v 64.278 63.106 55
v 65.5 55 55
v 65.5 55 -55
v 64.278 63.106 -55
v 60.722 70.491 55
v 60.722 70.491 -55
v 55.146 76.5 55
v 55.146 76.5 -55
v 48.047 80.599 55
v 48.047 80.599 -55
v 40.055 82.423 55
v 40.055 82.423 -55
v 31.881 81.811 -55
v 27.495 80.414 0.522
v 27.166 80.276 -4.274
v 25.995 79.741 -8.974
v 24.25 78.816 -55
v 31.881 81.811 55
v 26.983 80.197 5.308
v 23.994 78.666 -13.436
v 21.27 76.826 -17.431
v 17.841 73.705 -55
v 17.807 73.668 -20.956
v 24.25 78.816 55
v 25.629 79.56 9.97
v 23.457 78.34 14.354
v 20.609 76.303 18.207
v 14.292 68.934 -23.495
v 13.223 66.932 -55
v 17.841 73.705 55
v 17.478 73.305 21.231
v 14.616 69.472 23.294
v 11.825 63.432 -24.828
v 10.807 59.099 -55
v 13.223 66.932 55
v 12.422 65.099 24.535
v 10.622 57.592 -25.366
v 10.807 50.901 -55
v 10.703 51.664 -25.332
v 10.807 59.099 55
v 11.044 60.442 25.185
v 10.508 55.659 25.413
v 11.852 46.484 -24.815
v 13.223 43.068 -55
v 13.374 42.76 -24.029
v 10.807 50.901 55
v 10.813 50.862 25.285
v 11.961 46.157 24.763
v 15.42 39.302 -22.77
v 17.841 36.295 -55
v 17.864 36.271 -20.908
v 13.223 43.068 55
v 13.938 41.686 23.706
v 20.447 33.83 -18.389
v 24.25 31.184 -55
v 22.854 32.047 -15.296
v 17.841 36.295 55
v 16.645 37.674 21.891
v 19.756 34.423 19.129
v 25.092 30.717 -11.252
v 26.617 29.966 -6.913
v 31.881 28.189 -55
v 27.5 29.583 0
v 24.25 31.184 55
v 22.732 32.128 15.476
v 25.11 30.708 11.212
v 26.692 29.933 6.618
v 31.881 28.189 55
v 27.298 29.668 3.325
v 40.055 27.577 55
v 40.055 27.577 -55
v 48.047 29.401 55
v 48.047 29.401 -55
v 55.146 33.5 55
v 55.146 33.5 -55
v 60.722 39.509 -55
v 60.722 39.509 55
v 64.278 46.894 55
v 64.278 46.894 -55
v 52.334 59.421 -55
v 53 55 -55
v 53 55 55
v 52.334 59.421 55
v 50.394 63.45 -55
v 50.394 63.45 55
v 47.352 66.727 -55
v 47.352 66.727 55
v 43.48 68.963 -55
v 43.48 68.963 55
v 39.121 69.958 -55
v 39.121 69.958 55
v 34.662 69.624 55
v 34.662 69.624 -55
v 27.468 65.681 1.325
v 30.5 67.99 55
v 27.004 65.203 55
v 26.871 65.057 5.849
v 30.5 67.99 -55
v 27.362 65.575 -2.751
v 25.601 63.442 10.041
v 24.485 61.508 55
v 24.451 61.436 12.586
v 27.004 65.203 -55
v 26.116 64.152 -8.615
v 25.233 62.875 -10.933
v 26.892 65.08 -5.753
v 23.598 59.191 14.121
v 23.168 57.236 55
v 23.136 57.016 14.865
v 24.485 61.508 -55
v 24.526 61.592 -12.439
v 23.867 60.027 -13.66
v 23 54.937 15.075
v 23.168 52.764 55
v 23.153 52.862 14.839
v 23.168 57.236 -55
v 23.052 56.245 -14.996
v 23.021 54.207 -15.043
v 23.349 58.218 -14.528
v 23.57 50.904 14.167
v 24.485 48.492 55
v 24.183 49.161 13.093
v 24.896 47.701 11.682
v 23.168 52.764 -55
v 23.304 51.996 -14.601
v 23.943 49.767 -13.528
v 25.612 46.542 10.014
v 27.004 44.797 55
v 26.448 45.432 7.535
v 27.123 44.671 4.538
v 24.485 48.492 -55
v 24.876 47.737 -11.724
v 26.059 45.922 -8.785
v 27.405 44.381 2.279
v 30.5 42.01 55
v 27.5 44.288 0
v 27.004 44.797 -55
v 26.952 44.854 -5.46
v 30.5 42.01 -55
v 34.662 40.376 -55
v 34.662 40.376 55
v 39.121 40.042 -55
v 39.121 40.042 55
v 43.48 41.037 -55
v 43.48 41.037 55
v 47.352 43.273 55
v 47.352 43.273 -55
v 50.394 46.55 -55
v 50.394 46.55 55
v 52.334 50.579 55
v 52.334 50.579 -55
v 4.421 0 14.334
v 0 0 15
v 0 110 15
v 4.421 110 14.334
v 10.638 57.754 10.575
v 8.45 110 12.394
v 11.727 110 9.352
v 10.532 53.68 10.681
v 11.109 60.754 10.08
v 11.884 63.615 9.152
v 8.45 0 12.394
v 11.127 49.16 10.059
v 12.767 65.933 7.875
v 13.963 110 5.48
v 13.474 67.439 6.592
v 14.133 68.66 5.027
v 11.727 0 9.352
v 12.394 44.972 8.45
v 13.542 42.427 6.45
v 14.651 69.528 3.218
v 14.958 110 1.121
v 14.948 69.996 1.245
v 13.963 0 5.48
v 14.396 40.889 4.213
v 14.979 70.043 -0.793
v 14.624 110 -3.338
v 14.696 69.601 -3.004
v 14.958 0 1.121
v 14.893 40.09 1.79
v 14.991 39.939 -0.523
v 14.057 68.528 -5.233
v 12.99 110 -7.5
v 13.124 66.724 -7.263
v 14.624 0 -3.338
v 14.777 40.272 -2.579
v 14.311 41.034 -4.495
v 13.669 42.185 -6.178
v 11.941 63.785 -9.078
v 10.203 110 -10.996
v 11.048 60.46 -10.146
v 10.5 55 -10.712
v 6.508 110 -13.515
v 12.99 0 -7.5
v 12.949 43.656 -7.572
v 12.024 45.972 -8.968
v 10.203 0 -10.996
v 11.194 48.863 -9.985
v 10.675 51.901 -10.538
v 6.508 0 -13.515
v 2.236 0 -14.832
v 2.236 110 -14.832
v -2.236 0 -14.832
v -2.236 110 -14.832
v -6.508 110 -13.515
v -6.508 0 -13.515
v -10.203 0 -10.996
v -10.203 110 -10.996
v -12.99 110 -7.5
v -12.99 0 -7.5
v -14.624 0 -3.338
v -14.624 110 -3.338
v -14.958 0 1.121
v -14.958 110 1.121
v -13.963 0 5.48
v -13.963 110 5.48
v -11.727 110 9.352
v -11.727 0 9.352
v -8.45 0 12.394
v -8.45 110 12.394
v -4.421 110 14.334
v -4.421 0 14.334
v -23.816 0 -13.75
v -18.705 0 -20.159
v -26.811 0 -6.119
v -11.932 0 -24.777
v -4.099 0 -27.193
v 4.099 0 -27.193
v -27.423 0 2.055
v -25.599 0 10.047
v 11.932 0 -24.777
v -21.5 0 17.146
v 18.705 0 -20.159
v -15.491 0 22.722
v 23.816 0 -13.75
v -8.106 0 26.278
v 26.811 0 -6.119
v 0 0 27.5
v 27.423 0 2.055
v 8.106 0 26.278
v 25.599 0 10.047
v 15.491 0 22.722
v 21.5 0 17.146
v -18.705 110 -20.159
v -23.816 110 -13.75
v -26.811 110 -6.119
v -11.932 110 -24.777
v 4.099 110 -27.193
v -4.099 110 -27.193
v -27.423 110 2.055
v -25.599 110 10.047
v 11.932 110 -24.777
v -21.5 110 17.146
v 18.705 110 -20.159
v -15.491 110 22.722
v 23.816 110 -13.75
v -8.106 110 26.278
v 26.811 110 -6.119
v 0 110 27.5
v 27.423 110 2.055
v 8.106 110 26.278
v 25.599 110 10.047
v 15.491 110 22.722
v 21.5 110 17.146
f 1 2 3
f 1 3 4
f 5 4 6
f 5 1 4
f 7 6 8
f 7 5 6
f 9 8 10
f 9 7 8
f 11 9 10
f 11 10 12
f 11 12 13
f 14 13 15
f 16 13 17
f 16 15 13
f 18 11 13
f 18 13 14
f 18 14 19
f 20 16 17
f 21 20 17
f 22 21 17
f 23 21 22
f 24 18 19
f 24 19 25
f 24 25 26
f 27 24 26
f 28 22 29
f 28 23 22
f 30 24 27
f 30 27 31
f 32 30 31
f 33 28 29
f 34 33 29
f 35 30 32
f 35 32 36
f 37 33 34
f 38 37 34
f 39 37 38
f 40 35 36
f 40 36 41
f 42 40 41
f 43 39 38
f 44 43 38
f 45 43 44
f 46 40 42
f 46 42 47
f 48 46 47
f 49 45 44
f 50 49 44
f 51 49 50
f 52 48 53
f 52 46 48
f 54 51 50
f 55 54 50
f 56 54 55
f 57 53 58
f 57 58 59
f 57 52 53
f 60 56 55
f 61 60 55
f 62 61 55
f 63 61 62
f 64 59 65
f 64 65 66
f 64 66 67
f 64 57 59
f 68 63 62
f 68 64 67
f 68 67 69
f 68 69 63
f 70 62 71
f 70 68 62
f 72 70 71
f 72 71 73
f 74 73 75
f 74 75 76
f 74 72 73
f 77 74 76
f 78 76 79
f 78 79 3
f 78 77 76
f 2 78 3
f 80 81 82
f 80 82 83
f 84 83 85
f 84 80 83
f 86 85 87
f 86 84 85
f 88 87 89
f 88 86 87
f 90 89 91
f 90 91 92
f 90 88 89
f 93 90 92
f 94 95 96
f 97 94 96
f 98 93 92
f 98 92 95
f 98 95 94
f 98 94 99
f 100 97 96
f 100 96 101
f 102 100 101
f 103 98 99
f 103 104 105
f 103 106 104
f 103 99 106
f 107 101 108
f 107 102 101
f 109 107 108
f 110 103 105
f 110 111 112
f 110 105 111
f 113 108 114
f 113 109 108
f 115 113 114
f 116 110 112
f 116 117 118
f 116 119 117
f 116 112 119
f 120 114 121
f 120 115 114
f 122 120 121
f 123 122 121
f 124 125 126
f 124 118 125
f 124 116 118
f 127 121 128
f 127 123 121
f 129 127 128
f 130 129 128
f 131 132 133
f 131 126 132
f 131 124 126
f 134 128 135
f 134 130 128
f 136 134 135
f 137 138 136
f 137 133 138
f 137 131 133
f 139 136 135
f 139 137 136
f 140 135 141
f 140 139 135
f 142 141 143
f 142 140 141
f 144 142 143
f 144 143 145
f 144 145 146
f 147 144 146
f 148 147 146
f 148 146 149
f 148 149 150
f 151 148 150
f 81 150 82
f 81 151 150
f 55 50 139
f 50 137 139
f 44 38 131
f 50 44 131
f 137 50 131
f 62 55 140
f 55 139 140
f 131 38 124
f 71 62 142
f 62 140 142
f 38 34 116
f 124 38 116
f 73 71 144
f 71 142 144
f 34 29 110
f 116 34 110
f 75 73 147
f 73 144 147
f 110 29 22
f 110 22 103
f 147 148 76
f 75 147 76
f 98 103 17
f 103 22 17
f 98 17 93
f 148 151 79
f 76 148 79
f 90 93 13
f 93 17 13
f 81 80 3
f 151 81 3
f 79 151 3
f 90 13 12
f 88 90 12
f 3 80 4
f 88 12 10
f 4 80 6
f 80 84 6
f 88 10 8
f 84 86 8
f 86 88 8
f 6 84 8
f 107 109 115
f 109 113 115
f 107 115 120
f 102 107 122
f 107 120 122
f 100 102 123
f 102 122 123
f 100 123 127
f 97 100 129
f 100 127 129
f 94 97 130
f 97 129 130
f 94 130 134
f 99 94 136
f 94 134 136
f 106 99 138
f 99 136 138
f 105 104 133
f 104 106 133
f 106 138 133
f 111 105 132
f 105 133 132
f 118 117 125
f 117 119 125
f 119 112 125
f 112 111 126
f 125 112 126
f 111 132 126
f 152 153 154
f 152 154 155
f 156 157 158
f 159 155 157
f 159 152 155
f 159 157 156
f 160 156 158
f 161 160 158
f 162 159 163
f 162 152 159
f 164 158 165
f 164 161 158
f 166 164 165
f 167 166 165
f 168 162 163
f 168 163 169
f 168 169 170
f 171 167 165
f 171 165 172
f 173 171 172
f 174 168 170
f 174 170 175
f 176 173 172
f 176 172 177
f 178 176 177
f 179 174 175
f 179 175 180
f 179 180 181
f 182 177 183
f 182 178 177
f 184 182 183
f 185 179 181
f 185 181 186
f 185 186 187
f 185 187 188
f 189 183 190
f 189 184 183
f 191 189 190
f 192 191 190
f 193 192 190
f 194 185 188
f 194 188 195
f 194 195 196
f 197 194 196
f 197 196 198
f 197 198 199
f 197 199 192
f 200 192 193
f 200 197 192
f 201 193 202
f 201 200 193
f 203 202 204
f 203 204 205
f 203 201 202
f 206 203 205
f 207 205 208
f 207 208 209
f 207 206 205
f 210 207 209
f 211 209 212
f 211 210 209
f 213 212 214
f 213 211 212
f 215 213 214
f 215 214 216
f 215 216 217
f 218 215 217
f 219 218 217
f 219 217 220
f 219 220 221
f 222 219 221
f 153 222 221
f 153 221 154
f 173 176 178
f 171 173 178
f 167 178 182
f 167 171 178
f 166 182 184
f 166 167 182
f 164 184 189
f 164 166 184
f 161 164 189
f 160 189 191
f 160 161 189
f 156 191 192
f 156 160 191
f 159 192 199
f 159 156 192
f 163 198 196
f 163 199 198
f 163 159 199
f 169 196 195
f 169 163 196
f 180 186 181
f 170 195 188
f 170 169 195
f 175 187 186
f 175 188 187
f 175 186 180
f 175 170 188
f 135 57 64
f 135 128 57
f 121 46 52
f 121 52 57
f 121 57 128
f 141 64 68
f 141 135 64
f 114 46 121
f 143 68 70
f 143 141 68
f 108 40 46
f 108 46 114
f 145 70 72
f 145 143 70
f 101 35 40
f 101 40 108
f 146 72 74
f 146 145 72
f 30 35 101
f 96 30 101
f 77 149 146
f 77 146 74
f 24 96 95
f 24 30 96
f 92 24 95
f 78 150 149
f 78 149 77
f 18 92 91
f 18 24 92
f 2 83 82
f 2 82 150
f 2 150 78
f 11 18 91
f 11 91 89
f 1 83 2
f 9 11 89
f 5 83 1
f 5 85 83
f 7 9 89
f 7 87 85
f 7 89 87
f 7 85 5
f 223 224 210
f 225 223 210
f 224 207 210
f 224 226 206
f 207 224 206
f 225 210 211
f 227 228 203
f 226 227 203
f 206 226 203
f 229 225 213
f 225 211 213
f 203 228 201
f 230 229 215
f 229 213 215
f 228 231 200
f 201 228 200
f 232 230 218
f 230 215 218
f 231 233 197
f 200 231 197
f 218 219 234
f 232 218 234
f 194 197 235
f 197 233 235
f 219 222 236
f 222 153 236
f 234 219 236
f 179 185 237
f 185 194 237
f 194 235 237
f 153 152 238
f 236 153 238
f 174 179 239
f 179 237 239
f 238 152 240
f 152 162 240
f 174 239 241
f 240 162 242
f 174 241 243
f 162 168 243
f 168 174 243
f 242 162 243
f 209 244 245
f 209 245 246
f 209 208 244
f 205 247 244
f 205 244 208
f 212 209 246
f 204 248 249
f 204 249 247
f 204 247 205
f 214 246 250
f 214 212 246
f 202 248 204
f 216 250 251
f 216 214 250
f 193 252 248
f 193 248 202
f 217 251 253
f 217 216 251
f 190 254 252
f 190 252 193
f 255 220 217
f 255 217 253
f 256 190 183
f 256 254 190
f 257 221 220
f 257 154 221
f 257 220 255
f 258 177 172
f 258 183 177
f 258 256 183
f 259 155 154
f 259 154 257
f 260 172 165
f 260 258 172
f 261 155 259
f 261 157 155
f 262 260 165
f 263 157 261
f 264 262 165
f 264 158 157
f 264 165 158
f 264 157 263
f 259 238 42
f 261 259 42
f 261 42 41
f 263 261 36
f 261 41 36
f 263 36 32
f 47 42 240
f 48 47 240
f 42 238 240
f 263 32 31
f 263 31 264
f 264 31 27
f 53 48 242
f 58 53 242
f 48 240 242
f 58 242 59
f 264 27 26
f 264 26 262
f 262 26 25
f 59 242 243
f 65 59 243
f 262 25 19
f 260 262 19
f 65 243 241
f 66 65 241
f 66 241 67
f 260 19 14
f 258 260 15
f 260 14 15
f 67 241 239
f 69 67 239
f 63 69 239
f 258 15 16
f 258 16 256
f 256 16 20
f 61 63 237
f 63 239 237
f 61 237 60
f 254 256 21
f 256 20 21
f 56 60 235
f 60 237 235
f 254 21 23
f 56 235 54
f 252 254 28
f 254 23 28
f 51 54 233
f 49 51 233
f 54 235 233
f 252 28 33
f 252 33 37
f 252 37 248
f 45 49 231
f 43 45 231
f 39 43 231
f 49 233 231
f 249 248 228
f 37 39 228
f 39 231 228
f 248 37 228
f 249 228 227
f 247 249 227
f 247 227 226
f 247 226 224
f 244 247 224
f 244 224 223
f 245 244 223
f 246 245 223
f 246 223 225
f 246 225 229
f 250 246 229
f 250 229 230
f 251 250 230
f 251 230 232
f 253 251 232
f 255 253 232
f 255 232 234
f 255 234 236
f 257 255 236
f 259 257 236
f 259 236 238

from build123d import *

# Parameters (mm, degrees)
SKETCH2_R           = 27.5
SKETCH2_R_2         = 15
BOSS_EXTRUDE1_DEPTH = 110
SKETCH3_R           = 27.5
SKETCH3_R_2         = 15
BOSS_EXTRUDE2_DEPTH = 55


with BuildPart() as part:
    # Sketch2 → Boss-Extrude1 (new body)
    with BuildSketch(Plane(origin=(0, 0, 0), x_dir=(1, 0, 0), z_dir=(0, 1, 0))):
        with Locations(Location((0, 0, 0), (0, 0, 270))):
            Circle(SKETCH2_R)
        with Locations(Location((0, 0, 0), (0, 0, 270))):
            Circle(SKETCH2_R_2, mode=Mode.SUBTRACT)
    extrude(amount=BOSS_EXTRUDE1_DEPTH)

    # Sketch3 → Boss-Extrude2 (add, symmetric)
    with BuildSketch(Plane.XY):
        with Locations((38, 55)):
            Circle(SKETCH3_R)
        with Locations((38, 55)):
            Circle(SKETCH3_R_2, mode=Mode.SUBTRACT)
    extrude(amount=BOSS_EXTRUDE2_DEPTH, both=True)


solid = part.part
